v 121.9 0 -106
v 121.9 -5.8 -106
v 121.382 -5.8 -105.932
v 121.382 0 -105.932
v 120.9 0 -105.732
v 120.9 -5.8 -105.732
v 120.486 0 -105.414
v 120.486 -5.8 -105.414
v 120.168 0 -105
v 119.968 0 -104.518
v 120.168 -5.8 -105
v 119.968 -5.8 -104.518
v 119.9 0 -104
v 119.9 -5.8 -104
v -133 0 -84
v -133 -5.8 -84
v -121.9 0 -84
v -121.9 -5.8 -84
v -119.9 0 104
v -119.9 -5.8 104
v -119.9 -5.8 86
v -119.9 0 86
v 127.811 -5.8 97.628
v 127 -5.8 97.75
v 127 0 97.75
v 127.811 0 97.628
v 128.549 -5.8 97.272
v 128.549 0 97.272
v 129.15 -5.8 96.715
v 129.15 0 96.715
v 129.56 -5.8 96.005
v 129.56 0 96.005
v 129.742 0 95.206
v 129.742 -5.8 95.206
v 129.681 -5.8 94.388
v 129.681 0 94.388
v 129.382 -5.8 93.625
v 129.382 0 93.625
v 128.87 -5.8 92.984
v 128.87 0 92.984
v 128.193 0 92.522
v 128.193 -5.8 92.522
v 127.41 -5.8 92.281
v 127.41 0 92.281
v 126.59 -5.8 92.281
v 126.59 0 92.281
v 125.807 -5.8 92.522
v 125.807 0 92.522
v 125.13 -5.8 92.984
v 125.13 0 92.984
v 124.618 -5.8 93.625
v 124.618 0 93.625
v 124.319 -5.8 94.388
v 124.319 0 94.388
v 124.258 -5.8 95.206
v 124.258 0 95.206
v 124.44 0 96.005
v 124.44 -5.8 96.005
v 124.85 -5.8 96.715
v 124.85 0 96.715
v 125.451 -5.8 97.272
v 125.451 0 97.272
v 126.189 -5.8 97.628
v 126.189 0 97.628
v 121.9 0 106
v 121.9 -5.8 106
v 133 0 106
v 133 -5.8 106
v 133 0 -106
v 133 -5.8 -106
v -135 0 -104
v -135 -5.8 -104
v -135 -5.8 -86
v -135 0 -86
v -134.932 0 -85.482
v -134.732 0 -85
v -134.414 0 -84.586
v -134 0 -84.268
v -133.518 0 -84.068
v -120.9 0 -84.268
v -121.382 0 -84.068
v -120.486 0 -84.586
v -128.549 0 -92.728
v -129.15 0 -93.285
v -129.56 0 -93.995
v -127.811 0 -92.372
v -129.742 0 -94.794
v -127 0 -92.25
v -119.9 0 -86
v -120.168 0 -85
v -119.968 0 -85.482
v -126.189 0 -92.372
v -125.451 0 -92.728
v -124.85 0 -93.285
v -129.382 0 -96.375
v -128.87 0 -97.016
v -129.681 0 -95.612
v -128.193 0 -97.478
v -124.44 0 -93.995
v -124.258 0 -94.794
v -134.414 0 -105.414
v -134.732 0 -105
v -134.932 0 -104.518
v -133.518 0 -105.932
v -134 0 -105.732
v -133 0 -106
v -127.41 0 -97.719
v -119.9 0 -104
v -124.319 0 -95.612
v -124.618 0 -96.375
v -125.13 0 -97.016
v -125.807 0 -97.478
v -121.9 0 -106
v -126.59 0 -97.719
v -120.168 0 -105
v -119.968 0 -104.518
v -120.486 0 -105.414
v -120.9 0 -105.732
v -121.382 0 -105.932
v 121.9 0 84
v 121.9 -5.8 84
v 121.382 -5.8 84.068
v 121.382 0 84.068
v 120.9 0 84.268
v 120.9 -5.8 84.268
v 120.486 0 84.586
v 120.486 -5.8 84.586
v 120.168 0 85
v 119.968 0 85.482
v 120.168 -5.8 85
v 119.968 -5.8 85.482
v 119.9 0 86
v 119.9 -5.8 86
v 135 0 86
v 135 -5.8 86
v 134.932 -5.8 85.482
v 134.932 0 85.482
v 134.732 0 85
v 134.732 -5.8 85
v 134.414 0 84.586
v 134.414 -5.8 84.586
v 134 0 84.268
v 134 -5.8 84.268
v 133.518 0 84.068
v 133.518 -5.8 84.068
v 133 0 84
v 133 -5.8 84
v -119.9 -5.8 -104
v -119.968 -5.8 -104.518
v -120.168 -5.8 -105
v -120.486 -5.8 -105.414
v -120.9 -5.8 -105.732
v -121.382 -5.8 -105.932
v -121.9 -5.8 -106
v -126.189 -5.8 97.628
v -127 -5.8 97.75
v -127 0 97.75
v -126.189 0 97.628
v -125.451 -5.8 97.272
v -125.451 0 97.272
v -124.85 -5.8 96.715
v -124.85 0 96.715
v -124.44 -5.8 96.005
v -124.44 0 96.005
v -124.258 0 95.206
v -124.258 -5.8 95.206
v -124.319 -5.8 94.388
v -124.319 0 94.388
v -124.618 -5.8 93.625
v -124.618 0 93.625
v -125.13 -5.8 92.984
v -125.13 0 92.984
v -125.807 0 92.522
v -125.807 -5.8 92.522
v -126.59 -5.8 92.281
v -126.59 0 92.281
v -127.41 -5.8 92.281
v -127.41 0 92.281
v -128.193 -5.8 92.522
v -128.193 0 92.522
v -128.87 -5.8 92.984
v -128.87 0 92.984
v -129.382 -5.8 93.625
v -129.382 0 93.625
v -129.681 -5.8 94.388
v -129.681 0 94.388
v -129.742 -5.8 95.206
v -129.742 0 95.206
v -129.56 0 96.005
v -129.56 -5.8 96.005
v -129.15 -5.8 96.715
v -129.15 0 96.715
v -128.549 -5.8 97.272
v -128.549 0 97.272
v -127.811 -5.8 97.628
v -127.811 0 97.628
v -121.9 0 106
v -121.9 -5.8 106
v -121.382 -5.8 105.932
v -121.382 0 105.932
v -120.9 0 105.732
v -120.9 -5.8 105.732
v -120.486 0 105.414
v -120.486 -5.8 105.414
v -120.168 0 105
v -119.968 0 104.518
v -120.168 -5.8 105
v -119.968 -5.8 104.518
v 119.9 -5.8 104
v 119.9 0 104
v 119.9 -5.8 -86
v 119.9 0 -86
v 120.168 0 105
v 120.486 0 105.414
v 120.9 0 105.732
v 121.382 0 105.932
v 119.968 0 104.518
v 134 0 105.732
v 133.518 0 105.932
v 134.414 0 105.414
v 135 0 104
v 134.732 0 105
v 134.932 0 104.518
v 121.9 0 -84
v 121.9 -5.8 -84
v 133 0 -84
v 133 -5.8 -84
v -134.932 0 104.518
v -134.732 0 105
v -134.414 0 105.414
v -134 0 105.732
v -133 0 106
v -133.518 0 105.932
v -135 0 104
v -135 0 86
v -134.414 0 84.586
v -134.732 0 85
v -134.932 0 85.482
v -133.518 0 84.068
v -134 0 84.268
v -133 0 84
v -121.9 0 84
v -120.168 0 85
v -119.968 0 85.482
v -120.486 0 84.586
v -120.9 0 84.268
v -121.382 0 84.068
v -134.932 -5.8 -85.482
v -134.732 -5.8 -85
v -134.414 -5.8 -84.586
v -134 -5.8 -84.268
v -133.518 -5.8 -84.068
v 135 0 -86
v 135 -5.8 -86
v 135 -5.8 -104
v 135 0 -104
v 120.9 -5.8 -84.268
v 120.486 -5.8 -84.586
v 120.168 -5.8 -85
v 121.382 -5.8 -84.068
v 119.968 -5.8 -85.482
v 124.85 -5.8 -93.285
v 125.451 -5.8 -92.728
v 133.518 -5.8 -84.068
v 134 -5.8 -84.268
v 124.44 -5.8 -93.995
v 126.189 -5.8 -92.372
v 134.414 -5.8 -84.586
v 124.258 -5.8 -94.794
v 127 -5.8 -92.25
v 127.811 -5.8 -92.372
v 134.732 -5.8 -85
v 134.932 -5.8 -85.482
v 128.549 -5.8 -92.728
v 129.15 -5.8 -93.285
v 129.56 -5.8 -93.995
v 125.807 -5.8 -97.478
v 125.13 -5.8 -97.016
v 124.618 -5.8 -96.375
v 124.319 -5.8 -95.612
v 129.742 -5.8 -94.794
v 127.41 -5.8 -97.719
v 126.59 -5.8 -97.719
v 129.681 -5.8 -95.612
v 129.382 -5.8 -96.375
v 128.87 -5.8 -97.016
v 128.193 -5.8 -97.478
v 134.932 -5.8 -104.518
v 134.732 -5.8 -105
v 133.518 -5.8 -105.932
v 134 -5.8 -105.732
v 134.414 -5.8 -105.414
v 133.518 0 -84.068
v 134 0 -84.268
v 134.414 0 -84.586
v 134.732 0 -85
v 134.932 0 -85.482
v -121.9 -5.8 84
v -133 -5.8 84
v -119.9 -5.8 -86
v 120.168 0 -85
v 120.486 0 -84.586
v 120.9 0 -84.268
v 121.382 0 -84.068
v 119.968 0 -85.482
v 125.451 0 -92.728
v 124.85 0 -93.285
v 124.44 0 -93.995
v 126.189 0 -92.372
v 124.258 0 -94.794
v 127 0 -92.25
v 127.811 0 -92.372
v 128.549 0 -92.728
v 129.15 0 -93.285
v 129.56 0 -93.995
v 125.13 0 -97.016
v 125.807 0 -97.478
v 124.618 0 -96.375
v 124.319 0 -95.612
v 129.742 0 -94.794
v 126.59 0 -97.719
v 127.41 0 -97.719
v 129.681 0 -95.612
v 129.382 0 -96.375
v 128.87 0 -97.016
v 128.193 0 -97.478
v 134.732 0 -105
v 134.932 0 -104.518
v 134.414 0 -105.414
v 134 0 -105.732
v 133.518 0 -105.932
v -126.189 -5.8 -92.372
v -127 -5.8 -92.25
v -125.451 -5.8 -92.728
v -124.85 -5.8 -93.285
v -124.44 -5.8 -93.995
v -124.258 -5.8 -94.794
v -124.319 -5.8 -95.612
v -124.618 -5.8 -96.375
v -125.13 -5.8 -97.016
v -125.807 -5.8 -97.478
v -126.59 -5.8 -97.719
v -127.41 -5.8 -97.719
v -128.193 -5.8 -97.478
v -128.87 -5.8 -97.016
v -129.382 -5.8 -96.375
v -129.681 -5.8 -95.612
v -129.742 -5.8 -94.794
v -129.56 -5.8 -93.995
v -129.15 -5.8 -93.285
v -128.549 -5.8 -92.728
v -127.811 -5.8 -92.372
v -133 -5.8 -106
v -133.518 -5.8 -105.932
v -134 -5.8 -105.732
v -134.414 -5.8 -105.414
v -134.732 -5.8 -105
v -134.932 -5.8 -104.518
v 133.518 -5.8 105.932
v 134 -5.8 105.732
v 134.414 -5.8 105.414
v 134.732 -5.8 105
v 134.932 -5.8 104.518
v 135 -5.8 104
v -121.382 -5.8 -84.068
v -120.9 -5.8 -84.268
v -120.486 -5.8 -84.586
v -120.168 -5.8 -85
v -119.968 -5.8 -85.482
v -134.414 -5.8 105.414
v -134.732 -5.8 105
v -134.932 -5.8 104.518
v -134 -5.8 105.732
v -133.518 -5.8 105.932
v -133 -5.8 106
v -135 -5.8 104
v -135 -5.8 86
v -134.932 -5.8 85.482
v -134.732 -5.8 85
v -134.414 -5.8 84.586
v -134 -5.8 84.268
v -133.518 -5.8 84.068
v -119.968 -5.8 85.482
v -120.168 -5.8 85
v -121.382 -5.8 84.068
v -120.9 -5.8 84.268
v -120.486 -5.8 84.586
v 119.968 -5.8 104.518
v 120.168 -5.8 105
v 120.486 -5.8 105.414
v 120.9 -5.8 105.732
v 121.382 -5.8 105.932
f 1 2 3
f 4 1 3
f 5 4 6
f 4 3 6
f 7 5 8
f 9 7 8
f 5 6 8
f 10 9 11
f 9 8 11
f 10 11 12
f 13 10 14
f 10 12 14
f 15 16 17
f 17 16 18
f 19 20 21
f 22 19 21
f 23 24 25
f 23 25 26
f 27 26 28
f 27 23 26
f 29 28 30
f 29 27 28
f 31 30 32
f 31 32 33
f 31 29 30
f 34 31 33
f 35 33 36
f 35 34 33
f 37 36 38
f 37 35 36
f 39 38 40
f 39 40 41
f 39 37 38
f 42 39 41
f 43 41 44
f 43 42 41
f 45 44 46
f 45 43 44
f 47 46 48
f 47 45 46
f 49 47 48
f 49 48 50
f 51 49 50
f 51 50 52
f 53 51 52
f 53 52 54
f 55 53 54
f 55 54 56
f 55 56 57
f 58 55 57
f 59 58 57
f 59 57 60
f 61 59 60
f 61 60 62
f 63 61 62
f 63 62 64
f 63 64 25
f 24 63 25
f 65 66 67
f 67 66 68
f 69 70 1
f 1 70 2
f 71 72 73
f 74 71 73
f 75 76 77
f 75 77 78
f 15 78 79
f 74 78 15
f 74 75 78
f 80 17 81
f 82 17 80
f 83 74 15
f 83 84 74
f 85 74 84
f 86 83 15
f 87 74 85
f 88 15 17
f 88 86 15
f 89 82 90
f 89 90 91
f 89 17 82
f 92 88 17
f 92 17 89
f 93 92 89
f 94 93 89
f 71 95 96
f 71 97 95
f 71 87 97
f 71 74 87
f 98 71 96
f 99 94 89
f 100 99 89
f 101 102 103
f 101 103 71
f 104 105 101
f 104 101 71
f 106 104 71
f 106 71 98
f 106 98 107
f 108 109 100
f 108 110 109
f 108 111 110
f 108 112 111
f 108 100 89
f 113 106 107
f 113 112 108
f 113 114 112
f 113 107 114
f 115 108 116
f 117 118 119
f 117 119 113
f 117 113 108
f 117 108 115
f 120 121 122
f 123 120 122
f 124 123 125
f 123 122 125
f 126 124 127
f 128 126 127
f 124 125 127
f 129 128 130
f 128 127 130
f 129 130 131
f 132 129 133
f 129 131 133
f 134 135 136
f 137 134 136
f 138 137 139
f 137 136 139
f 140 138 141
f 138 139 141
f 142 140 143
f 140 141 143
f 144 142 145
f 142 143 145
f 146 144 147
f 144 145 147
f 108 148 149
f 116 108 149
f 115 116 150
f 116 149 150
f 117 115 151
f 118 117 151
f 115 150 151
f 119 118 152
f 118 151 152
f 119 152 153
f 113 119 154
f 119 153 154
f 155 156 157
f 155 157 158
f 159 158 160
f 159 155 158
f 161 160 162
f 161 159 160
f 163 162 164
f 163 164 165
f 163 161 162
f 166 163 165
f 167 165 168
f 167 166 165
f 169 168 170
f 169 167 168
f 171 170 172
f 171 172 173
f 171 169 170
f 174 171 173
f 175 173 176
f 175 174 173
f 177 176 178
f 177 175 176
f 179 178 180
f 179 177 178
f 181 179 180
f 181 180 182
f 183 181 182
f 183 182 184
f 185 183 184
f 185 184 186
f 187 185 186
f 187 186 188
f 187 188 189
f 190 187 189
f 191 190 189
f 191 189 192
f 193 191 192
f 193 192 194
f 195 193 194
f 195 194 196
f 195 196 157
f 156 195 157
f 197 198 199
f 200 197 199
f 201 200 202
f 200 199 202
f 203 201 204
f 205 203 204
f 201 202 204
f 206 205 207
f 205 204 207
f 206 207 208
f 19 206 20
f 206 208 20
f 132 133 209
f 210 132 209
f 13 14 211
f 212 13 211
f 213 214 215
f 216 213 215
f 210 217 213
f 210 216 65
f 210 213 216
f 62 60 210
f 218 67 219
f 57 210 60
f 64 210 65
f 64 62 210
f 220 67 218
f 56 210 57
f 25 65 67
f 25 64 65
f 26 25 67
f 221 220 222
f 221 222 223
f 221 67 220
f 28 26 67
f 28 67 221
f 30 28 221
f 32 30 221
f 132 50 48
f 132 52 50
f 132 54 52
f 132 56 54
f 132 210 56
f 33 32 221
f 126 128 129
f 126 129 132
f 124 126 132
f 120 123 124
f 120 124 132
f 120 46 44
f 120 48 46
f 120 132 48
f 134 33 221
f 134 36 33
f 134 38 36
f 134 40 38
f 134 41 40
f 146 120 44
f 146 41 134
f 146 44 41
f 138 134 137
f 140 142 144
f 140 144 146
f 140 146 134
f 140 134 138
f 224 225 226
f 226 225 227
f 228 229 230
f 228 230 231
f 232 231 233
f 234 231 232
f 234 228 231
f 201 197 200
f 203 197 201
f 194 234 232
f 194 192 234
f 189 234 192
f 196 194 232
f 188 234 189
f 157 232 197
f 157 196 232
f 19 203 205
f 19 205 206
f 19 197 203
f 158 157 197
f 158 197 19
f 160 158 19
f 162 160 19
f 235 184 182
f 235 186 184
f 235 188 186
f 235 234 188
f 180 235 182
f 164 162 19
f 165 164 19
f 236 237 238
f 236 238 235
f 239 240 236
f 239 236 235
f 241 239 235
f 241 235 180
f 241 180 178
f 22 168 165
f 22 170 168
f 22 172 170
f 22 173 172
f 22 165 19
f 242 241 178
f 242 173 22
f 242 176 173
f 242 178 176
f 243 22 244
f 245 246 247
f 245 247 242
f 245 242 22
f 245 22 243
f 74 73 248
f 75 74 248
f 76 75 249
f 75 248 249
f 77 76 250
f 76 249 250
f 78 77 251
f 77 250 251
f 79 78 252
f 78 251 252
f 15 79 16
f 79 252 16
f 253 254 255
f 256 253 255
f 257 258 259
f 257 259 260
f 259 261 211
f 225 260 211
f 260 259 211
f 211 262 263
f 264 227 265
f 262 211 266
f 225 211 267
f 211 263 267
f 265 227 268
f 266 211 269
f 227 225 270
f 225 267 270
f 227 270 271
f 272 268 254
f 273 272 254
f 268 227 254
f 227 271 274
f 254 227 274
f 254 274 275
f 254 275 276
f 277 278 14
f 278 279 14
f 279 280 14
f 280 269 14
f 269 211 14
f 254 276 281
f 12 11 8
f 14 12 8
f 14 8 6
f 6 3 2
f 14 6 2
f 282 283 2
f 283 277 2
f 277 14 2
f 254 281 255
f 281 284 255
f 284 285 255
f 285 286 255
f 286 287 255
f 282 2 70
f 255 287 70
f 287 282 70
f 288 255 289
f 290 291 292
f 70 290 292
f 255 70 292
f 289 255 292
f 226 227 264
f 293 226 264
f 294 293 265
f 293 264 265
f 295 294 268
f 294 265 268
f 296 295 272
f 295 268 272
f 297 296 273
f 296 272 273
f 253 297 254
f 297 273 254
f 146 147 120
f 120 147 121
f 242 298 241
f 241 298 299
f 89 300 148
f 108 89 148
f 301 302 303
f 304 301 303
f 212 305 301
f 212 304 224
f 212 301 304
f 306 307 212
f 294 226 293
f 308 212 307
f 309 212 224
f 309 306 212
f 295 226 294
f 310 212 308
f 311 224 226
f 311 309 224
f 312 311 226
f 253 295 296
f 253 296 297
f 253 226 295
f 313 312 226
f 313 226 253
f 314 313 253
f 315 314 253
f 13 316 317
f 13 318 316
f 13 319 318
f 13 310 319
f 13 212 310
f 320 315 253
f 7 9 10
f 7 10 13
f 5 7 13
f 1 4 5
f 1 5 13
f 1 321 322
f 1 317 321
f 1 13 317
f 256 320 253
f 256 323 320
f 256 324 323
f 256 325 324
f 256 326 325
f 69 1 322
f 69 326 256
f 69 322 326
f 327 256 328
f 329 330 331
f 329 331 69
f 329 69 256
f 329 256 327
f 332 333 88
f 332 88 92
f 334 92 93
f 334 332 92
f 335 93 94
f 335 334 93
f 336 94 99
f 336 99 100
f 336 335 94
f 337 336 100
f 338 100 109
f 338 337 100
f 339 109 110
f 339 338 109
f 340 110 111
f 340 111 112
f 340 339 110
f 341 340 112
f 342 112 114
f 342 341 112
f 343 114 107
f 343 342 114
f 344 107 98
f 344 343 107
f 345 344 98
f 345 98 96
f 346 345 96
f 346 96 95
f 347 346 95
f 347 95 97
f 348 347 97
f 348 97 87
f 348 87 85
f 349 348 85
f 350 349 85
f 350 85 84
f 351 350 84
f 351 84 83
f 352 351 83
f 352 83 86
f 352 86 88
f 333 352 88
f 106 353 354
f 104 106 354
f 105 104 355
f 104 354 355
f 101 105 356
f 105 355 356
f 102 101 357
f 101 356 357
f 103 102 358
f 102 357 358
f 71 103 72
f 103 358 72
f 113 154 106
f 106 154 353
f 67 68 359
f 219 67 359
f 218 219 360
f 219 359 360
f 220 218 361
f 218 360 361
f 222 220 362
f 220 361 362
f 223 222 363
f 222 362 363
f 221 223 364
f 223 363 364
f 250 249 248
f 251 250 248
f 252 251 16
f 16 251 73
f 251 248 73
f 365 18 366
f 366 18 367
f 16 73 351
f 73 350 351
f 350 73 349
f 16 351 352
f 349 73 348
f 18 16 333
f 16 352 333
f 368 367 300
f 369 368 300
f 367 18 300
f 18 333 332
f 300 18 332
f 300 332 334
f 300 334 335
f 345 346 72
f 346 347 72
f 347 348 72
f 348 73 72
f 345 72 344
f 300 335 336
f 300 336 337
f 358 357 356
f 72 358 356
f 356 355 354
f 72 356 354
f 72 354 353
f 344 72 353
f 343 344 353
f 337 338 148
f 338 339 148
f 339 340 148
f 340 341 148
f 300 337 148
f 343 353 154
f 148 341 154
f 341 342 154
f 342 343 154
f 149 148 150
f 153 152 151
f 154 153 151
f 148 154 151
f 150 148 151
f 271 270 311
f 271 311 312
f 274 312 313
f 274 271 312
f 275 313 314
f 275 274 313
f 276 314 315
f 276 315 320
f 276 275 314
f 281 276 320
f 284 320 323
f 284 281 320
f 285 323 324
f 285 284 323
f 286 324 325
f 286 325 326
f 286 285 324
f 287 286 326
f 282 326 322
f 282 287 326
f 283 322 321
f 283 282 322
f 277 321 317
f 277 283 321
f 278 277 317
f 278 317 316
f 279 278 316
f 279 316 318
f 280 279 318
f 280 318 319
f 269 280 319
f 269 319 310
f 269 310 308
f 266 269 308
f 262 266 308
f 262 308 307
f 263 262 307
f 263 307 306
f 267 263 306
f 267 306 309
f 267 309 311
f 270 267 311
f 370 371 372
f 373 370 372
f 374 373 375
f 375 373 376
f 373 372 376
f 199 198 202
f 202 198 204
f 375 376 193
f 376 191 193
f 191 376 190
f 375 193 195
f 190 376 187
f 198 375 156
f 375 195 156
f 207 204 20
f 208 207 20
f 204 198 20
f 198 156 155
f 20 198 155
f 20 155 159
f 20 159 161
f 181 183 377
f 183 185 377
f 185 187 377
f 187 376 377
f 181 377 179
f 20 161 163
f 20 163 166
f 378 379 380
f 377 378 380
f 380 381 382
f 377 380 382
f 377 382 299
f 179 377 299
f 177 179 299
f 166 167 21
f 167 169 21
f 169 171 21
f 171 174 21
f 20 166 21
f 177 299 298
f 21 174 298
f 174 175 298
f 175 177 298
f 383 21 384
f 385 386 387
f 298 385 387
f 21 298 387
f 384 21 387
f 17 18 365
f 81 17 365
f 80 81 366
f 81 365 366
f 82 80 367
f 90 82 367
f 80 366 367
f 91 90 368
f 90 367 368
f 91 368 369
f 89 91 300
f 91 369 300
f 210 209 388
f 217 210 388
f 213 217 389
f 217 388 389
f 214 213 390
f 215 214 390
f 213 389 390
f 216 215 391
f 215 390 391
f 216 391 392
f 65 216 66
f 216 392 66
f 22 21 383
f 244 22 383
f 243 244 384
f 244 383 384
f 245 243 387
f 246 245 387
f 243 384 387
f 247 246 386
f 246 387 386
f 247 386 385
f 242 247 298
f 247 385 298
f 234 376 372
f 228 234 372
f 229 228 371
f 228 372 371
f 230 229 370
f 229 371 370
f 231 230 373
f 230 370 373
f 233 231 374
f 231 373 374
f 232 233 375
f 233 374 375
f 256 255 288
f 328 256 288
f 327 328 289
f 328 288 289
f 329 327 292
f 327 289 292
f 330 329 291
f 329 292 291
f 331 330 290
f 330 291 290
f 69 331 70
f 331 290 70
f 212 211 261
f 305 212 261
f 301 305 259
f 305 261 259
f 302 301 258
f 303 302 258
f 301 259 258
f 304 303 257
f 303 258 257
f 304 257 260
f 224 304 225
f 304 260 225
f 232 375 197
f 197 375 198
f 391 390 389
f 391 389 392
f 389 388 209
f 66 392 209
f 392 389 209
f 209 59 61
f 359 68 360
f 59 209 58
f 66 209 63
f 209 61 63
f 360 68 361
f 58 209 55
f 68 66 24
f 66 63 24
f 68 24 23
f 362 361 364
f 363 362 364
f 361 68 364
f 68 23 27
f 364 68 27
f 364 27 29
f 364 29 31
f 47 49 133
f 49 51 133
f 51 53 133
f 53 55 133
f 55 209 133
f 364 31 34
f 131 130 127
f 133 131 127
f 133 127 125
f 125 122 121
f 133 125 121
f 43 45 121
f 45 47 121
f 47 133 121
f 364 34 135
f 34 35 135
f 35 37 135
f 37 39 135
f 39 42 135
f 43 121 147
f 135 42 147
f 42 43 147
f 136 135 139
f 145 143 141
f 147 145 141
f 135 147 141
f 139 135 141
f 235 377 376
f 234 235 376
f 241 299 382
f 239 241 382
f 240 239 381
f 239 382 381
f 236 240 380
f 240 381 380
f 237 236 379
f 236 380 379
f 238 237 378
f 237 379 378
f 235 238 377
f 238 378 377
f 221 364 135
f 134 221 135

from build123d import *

# Parameters (mm, degrees)
SKETCH1_R             = 2.75
BOSS_EXTRUDE1_DEPTH   = 2.9
BOSS_EXTRUDE1_2_DEPTH = 2.9
BOSS_EXTRUDE1_3_DEPTH = 2.9
BOSS_EXTRUDE1_4_DEPTH = 2.9
SKETCH2_R             = 2.75
BOSS_EXTRUDE2_DEPTH   = 2.9


with BuildPart() as part:
    # Sketch1 → Boss-Extrude1 (new body)
    with BuildSketch(Plane(origin=(0, -2.9, 0), x_dir=(1, 0, 0), z_dir=(0, 1, 0))):
        with BuildLine():
            Line((121.9, -106), (133, -106))
            ThreePointArc((133, -106), (134.414213562, -105.414213562), (135, -104))
            Line((135, -104), (135, -86))
            ThreePointArc((135, -86), (134.414213562, -84.585786438), (133, -84))
            Line((133, -84), (121.9, -84))
            ThreePointArc((121.9, -84), (120.485786438, -84.585786438), (119.9, -86))
            Line((119.9, -86), (119.9, -104))
            ThreePointArc((119.9, -104), (120.485786438, -105.414213562), (121.9, -106))
        make_face()
        with Locations(Location((127, -95, 0), (0, 0, 270))):
            Circle(SKETCH1_R, mode=Mode.SUBTRACT)
    extrude(amount=BOSS_EXTRUDE1_DEPTH)



with BuildPart() as body_2:
    # Sketch1 → Boss-Extrude1 2 (new body)
    with BuildSketch(Plane(origin=(0, -2.9, 0), x_dir=(1, 0, 0), z_dir=(0, 1, 0))):
        with BuildLine():
            Line((121.9, 84), (133, 84))
            ThreePointArc((133, 84), (134.414213562, 84.585786438), (135, 86))
            Line((135, 86), (135, 104))
            ThreePointArc((135, 104), (134.414213562, 105.414213562), (133, 106))
            Line((133, 106), (121.9, 106))
            ThreePointArc((121.9, 106), (120.485786438, 105.414213562), (119.9, 104))
            Line((119.9, 104), (119.9, 86))
            ThreePointArc((119.9, 86), (120.485786438, 84.585786438), (121.9, 84))
        make_face()
        with Locations(Location((127, 95, 0), (0, 0, 270))):
            Circle(SKETCH1_R, mode=Mode.SUBTRACT)
    extrude(amount=BOSS_EXTRUDE1_2_DEPTH)


with BuildPart() as body_3:
    # Sketch1 → Boss-Extrude1 3 (new body)
    with BuildSketch(Plane(origin=(0, -2.9, 0), x_dir=(1, 0, 0), z_dir=(0, 1, 0))):
        with BuildLine():
            Line((-133, -106), (-121.9, -106))
            ThreePointArc((-121.9, -106), (-120.485786438, -105.414213562), (-119.9, -104))
            Line((-119.9, -104), (-119.9, -86))
            ThreePointArc((-119.9, -86), (-120.485786438, -84.585786438), (-121.9, -84))
            Line((-121.9, -84), (-133, -84))
            ThreePointArc((-133, -84), (-134.414213562, -84.585786438), (-135, -86))
            Line((-135, -86), (-135, -104))
            ThreePointArc((-135, -104), (-134.414213562, -105.414213562), (-133, -106))
        make_face()
        with Locations(Location((-127, -95, 0), (0, 0, 270))):
            Circle(SKETCH1_R, mode=Mode.SUBTRACT)
    extrude(amount=BOSS_EXTRUDE1_3_DEPTH)


with BuildPart() as body_4:
    # Sketch1 → Boss-Extrude1 4 (new body)
    with BuildSketch(Plane(origin=(0, -2.9, 0), x_dir=(1, 0, 0), z_dir=(0, 1, 0))):
        with BuildLine():
            Line((-133, 84), (-121.9, 84))
            ThreePointArc((-121.9, 84), (-120.485786438, 84.585786438), (-119.9, 86))
            Line((-119.9, 86), (-119.9, 104))
            ThreePointArc((-119.9, 104), (-120.485786438, 105.414213562), (-121.9, 106))
            Line((-121.9, 106), (-133, 106))
            ThreePointArc((-133, 106), (-134.414213562, 105.414213562), (-135, 104))
            Line((-135, 104), (-135, 86))
            ThreePointArc((-135, 86), (-134.414213562, 84.585786438), (-133, 84))
        make_face()
        with Locations(Location((-127, 95, 0), (0, 0, 270))):
            Circle(SKETCH1_R, mode=Mode.SUBTRACT)
    extrude(amount=BOSS_EXTRUDE1_4_DEPTH)


with BuildPart() as part_1:
    add(part.part)

    add(body_2.part)  # Boss-Extrude2 merges body 2

    add(body_3.part)  # Boss-Extrude2 merges body 3

    add(body_4.part)  # Boss-Extrude2 merges body 4
    # Sketch2 → Boss-Extrude2 (add)
    # profile 1 of 4: a face of its own
    with BuildSketch(Plane(origin=(0, -5.8, 0), x_dir=(1, 0, 0), z_dir=(0, 1, 0))):
        with BuildLine():
            Line((121.9, -106), (133, -106))
            ThreePointArc((133, -106), (134.414213562, -105.414213562), (135, -104))
            Line((135, -104), (135, -86))
            ThreePointArc((135, -86), (134.414213562, -84.585786438), (133, -84))
            Line((133, -84), (121.9, -84))
            ThreePointArc((121.9, -84), (120.485786438, -84.585786438), (119.9, -86))
            Line((119.9, -86), (119.9, -104))
            ThreePointArc((119.9, -104), (120.485786438, -105.414213562), (121.9, -106))
        make_face()
        with Locations(Location((127, -95, 0), (0, 0, 270))):
            Circle(SKETCH2_R, mode=Mode.SUBTRACT)
    # profile 2 of 4: a face of its own
    with BuildSketch(Plane(origin=(0, -5.8, 0), x_dir=(1, 0, 0), z_dir=(0, 1, 0))):
        with BuildLine():
            Line((121.9, 84), (133, 84))
            ThreePointArc((133, 84), (134.414213562, 84.585786438), (135, 86))
            Line((135, 86), (135, 104))
            ThreePointArc((135, 104), (134.414213562, 105.414213562), (133, 106))
            Line((133, 106), (121.9, 106))
            ThreePointArc((121.9, 106), (120.485786438, 105.414213562), (119.9, 104))
            Line((119.9, 104), (119.9, 86))
            ThreePointArc((119.9, 86), (120.485786438, 84.585786438), (121.9, 84))
        make_face()
        with Locations(Location((127, 95, 0), (0, 0, 270))):
            Circle(SKETCH2_R, mode=Mode.SUBTRACT)
    # profile 3 of 4: a face of its own
    with BuildSketch(Plane(origin=(0, -5.8, 0), x_dir=(1, 0, 0), z_dir=(0, 1, 0))):
        with BuildLine():
            Line((-133, -106), (-121.9, -106))
            ThreePointArc((-121.9, -106), (-120.485786438, -105.414213562), (-119.9, -104))
            Line((-119.9, -104), (-119.9, -86))
            ThreePointArc((-119.9, -86), (-120.485786438, -84.585786438), (-121.9, -84))
            Line((-121.9, -84), (-133, -84))
            ThreePointArc((-133, -84), (-134.414213562, -84.585786438), (-135, -86))
            Line((-135, -86), (-135, -104))
            ThreePointArc((-135, -104), (-134.414213562, -105.414213562), (-133, -106))
        make_face()
        with Locations(Location((-127, -95, 0), (0, 0, 270))):
            Circle(SKETCH2_R, mode=Mode.SUBTRACT)
    # profile 4 of 4: a face of its own
    with BuildSketch(Plane(origin=(0, -5.8, 0), x_dir=(1, 0, 0), z_dir=(0, 1, 0))):
        with BuildLine():
            Line((-133, 84), (-121.9, 84))
            ThreePointArc((-121.9, 84), (-120.485786438, 84.585786438), (-119.9, 86))
            Line((-119.9, 86), (-119.9, 104))
            ThreePointArc((-119.9, 104), (-120.485786438, 105.414213562), (-121.9, 106))
            Line((-121.9, 106), (-133, 106))
            ThreePointArc((-133, 106), (-134.414213562, 105.414213562), (-135, 104))
            Line((-135, 104), (-135, 86))
            ThreePointArc((-135, 86), (-134.414213562, 84.585786438), (-133, 84))
        make_face()
        with Locations(Location((-127, 95, 0), (0, 0, 270))):
            Circle(SKETCH2_R, mode=Mode.SUBTRACT)
    extrude(amount=BOSS_EXTRUDE2_DEPTH)


solid = part_1.part
